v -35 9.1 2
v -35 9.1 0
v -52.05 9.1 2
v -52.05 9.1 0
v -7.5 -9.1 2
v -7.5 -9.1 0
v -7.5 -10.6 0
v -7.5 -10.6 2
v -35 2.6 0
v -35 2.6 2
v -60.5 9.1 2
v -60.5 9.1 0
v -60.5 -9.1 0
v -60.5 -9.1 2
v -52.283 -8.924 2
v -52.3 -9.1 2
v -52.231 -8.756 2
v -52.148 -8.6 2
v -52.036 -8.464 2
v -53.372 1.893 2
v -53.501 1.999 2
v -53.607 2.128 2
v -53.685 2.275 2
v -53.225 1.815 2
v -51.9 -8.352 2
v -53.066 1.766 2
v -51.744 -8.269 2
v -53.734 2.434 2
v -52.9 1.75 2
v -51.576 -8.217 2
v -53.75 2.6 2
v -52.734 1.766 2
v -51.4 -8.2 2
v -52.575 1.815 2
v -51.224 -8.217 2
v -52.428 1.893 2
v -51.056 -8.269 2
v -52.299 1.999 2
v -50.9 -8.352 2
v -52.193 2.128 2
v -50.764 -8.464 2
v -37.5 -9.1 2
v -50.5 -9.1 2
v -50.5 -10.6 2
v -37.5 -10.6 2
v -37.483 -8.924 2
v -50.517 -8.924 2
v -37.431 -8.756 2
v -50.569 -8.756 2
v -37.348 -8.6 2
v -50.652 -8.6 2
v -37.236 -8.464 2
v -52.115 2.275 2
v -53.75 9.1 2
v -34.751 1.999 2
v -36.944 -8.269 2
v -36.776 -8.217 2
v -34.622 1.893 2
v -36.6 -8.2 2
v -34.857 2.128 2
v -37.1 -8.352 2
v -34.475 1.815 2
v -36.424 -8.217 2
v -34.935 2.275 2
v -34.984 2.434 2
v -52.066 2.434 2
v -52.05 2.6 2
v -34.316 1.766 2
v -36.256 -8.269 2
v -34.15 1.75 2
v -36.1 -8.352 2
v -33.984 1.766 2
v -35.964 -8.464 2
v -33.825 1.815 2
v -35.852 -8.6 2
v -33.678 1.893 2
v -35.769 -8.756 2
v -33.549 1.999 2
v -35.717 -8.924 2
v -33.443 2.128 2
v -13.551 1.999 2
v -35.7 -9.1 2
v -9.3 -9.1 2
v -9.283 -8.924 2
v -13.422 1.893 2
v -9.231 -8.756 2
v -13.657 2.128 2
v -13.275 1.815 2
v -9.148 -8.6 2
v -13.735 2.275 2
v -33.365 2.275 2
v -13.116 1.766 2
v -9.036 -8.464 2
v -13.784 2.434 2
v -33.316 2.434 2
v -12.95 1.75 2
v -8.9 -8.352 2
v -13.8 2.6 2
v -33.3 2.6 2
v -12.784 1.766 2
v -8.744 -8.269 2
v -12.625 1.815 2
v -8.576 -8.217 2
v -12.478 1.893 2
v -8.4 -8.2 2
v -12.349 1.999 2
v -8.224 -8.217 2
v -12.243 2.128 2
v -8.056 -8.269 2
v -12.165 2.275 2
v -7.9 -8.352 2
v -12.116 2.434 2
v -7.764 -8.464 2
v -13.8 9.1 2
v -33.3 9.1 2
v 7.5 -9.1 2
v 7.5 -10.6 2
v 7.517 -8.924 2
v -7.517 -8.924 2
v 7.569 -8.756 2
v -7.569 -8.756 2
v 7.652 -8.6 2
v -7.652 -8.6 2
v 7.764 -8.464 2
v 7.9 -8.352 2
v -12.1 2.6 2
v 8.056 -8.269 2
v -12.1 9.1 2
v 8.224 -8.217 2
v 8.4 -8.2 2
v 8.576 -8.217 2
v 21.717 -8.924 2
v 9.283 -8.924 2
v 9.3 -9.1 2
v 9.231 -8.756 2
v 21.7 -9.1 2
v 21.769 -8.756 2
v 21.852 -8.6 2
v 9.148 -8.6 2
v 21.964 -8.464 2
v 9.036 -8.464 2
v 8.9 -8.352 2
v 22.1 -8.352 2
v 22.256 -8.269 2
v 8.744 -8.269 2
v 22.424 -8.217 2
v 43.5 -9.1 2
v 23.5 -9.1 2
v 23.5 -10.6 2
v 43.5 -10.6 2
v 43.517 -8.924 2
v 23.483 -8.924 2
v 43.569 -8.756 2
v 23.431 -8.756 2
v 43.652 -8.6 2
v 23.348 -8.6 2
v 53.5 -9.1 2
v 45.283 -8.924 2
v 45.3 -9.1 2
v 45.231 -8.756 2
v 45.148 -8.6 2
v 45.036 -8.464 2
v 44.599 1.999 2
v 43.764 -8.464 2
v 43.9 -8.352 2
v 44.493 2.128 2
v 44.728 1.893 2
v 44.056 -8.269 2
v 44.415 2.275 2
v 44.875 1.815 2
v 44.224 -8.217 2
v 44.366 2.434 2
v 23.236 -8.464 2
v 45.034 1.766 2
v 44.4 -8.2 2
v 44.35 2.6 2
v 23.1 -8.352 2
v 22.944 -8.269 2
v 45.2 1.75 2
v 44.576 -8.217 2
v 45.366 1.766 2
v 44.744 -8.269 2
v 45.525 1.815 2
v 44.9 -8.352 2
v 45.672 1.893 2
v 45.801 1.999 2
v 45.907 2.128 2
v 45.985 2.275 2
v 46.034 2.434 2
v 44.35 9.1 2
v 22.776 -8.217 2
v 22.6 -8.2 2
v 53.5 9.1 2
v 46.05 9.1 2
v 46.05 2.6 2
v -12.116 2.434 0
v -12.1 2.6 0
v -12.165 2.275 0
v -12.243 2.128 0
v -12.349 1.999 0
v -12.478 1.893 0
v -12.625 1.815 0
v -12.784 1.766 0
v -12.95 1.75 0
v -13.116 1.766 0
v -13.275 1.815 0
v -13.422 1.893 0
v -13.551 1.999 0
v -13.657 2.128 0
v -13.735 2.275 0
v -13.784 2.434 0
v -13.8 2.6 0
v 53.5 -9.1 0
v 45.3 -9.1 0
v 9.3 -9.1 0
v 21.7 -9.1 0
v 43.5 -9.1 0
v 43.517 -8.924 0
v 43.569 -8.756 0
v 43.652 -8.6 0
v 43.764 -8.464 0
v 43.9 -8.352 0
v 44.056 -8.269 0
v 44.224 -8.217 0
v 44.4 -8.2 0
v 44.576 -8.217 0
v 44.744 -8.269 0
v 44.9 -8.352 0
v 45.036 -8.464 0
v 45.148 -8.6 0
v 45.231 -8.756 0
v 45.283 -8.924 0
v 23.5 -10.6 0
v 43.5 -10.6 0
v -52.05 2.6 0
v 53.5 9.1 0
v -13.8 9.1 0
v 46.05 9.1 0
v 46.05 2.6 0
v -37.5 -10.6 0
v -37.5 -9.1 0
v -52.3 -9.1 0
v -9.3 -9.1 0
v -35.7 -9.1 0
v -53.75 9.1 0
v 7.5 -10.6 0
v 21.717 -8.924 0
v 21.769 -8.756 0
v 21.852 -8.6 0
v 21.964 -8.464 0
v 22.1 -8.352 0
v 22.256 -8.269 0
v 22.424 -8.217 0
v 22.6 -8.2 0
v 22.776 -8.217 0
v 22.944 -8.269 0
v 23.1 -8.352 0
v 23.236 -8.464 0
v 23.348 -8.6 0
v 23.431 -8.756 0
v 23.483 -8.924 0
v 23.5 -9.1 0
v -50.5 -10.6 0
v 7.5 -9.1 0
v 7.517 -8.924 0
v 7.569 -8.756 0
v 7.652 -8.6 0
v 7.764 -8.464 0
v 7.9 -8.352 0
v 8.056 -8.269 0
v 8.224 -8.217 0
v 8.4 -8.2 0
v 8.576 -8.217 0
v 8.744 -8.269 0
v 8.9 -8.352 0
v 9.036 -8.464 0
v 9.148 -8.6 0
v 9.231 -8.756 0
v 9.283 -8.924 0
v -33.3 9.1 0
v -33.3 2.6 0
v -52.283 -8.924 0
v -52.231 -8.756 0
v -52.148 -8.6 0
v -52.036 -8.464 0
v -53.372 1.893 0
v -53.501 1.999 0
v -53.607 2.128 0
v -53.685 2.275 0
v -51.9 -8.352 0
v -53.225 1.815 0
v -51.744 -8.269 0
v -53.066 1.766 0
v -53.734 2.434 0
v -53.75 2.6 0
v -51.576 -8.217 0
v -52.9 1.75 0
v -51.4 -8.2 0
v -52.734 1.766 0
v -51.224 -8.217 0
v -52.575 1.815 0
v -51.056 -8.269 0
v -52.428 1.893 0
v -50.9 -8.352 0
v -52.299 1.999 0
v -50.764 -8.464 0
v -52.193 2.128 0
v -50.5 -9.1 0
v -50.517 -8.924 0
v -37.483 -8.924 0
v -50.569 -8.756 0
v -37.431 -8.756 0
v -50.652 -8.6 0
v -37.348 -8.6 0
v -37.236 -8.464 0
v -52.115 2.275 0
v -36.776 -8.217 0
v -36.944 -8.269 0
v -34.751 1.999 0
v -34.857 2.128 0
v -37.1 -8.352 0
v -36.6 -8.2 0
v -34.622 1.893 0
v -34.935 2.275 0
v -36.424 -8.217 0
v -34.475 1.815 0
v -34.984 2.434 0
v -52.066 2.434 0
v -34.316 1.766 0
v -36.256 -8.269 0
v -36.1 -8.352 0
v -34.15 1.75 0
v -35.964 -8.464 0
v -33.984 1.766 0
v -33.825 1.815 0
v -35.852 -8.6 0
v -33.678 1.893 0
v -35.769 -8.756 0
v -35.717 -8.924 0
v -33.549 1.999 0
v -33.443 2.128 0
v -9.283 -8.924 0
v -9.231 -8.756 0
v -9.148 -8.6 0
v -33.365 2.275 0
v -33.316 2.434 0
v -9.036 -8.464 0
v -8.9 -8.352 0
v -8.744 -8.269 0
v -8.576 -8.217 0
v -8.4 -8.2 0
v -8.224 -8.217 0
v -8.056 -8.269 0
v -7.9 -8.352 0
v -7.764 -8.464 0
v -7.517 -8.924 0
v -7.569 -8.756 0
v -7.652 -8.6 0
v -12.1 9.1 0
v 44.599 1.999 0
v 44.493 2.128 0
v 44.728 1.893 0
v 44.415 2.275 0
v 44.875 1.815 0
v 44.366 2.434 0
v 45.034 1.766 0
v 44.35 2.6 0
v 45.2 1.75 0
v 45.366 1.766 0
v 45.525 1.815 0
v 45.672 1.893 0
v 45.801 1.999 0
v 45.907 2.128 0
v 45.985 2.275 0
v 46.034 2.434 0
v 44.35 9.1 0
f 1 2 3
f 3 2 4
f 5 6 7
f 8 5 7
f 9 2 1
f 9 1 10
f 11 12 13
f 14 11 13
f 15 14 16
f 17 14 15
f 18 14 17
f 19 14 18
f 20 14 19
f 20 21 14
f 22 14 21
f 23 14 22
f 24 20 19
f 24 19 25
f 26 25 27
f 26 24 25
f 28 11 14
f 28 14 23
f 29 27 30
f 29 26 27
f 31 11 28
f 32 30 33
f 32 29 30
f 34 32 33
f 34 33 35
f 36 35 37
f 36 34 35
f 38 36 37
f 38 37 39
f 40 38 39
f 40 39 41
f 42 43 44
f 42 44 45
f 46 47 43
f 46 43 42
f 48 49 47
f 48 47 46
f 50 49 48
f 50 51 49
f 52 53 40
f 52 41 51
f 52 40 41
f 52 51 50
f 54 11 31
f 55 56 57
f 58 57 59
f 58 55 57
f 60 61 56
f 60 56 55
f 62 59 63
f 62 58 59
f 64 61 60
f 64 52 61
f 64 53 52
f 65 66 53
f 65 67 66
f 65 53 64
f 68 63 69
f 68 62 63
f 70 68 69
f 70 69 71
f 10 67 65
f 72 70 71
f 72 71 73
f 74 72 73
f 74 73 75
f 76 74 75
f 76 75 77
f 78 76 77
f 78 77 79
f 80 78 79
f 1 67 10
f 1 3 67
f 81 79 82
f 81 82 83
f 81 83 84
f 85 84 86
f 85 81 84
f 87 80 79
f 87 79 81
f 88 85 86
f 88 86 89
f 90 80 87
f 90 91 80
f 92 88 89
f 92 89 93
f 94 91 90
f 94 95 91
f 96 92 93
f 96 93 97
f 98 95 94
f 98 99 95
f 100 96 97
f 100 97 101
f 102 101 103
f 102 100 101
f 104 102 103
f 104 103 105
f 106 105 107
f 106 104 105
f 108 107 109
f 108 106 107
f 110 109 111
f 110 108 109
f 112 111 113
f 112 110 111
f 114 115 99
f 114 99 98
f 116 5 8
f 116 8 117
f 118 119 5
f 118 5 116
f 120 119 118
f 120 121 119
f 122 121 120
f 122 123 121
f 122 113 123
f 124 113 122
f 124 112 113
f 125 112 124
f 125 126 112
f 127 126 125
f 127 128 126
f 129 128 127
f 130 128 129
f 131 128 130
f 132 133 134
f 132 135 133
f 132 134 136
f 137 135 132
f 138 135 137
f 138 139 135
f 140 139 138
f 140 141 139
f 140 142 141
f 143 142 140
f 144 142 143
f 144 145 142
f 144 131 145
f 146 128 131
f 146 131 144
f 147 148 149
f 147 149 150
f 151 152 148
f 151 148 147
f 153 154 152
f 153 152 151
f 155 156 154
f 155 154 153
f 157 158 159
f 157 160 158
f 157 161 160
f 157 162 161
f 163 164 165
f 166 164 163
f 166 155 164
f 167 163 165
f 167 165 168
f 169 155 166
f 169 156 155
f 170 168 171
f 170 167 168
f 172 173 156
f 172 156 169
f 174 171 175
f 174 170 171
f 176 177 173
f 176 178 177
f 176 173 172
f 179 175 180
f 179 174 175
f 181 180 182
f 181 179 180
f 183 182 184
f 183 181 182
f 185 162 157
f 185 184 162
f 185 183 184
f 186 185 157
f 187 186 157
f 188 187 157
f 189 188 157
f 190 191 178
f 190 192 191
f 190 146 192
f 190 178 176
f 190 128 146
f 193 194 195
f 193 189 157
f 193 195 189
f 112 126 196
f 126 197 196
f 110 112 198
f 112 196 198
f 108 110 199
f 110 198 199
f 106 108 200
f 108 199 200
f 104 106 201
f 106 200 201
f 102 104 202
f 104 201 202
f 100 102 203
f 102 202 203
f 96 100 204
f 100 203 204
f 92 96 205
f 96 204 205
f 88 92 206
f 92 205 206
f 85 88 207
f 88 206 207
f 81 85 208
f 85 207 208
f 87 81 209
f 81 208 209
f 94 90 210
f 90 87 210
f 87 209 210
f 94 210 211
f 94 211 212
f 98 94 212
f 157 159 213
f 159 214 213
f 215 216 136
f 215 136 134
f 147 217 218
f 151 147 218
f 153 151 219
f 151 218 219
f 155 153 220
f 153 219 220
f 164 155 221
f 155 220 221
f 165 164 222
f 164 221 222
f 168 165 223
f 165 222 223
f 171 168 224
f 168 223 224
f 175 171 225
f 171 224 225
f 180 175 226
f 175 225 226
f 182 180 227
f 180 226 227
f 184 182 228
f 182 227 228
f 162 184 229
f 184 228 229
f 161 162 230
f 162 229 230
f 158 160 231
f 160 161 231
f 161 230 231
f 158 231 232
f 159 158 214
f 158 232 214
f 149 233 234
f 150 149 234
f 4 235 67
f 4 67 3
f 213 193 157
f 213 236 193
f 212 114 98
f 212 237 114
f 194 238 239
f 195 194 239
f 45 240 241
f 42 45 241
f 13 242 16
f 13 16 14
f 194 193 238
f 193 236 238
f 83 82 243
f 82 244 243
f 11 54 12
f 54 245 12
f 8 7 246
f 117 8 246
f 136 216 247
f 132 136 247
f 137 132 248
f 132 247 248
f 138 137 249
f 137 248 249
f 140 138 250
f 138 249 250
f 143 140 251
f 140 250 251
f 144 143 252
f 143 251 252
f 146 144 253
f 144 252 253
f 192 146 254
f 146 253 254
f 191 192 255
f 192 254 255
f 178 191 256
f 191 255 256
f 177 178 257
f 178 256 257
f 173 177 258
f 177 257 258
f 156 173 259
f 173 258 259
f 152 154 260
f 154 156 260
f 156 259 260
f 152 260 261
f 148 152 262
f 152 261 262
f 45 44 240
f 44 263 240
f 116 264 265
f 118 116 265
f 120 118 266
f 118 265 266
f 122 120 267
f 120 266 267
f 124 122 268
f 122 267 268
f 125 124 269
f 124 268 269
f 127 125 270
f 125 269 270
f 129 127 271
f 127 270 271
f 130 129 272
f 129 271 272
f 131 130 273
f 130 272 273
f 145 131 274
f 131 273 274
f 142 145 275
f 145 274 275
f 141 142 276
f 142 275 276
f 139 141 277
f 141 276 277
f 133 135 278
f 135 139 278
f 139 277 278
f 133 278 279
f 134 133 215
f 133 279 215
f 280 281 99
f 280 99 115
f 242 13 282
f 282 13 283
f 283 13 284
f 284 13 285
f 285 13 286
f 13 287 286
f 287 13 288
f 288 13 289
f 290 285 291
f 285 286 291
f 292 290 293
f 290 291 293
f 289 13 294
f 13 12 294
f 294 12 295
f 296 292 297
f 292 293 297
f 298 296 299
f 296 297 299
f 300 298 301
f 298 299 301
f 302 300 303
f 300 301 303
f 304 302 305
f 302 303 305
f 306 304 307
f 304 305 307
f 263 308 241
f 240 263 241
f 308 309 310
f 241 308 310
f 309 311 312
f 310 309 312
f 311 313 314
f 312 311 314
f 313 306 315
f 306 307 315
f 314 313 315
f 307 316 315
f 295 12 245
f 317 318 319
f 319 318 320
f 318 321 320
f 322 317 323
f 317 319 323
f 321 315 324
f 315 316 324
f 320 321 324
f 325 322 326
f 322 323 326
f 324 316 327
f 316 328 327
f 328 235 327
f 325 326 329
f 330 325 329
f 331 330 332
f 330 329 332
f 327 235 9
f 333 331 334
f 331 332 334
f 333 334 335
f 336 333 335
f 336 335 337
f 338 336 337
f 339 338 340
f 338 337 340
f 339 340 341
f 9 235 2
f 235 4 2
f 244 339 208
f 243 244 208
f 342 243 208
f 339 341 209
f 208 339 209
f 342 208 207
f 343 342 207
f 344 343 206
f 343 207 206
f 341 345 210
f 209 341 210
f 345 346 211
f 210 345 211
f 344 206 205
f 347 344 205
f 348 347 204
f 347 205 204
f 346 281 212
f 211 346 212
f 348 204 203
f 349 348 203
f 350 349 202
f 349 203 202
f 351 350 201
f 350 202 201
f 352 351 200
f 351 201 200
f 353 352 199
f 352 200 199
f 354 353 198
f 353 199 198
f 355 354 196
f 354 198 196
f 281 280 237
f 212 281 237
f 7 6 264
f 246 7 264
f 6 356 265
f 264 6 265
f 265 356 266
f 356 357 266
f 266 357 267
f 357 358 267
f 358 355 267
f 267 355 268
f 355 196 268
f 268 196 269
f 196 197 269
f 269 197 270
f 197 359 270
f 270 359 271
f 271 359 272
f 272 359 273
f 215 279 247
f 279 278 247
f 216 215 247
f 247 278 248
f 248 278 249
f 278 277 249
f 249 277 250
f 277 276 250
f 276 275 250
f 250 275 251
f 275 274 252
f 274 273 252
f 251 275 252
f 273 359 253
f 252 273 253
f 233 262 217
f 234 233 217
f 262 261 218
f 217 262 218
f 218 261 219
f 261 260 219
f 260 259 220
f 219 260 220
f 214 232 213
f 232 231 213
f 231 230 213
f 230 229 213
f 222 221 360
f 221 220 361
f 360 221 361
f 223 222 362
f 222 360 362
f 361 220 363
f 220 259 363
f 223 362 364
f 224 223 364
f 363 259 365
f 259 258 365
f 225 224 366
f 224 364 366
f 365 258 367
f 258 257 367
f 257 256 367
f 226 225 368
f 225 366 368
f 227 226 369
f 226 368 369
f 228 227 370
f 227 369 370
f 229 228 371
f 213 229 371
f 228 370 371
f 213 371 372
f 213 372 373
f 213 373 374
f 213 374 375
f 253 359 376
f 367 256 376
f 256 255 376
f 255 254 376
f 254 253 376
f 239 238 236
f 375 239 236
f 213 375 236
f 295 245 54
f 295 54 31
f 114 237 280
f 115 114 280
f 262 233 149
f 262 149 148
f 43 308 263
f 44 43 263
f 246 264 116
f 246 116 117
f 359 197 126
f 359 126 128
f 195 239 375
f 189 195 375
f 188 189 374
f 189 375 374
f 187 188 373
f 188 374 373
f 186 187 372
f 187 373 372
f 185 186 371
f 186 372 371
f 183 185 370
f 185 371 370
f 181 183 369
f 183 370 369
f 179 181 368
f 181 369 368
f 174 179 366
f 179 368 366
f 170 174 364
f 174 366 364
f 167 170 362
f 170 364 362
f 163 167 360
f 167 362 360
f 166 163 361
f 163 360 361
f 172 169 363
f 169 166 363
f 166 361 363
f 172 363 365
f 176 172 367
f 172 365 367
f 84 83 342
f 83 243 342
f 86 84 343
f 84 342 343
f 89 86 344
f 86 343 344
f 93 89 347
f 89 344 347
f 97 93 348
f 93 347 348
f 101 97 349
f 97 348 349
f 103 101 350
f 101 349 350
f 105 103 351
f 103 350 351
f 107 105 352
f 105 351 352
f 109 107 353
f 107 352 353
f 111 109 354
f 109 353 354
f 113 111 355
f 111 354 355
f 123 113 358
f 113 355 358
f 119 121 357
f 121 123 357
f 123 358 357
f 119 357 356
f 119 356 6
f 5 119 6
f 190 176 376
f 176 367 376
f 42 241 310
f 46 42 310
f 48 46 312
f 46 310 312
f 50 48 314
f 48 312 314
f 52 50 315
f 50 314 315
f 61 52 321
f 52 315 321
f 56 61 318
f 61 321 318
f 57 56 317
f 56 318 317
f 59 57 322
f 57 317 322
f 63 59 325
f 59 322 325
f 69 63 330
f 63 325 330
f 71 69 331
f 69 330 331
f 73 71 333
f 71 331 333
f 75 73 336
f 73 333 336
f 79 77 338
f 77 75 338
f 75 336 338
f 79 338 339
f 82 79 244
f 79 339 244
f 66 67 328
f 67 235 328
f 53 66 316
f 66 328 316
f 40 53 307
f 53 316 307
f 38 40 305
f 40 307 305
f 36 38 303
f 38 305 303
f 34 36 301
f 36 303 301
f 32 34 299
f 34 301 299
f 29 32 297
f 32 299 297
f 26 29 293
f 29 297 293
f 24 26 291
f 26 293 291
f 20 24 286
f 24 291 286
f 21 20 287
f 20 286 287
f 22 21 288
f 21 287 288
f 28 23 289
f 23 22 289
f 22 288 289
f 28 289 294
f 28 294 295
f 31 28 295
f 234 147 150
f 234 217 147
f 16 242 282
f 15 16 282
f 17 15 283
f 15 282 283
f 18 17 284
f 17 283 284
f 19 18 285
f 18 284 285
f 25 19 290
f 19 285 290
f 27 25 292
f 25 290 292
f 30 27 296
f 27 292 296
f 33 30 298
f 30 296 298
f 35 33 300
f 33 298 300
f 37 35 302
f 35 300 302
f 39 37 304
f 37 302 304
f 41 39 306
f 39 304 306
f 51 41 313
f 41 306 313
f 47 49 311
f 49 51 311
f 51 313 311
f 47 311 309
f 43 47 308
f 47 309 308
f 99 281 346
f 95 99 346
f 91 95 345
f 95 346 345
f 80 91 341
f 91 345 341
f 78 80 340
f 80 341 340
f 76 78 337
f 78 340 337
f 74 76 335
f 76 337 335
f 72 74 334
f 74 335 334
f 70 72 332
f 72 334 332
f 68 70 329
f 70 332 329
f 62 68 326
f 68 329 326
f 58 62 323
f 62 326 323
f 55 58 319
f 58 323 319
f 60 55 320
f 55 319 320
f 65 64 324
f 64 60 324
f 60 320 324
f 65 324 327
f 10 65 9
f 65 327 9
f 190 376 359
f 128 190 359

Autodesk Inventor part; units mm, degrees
ref_plane "YZ Plane" through (0, 0, 0) normal (1, 0, 0) x (0, 1, 0)
ref_plane "XZ Plane" through (0, 0, 0) normal (0, 1, 0) x (-1, 0, 0)
ref_plane "XY Plane" through (0, 0, 0) normal (0, 0, 1) x (1, 0, 0)
sketch "Sketch4" plane through (0, 0, 0) normal (0, 0, 1) x (1, 0, 0)
  line L0 (-60.5, 9.1) -> (-60.5, -9.1)
  line L1 (53.5, 9.1) -> (53.5, -9.1)
  line L2 (-37.5, -10.6) -> (-37.5, -9.1)
  line L3 (-50.5, -9.1) -> (-50.5, -10.6)
  line L4 (-52.3, -9.1) -> (-60.5, -9.1)
  line L5 (-35.7, -9.1) -> (-9.3, -9.1)
  line L6 (-7.5, -9.1) -> (-7.5, -10.6)
  line L7 (23.5, -10.6) -> (23.5, -9.1)
  line L8 (43.5, -9.1) -> (43.5, -10.6)
  line L9 (45.3, -9.1) -> (53.5, -9.1)
  line L10 (21.7, -9.1) -> (9.3, -9.1)
  line L11 (7.5, -9.1) -> (7.5, -10.6)
  line L12 (-50.5, -10.6) -> (-37.5, -10.6)
  line L13 (-7.5, -10.6) -> (7.5, -10.6)
  line L14 (23.5, -10.6) -> (43.5, -10.6)
  arc A0 (-50.5, -9.1) -> (-52.3, -9.1) centre (-51.4, -9.1) ccw
  arc A1 (-35.7, -9.1) -> (-37.5, -9.1) centre (-36.6, -9.1) ccw
  arc A2 (-7.5, -9.1) -> (-9.3, -9.1) centre (-8.4, -9.1) ccw
  arc A3 (9.3, -9.1) -> (7.5, -9.1) centre (8.4, -9.1) ccw
  arc A4 (23.5, -9.1) -> (21.7, -9.1) centre (22.6, -9.1) ccw
  arc A5 (45.3, -9.1) -> (43.5, -9.1) centre (44.4, -9.1) ccw
  line L15 (-53.75, 9.1) -> (-53.75, 2.6)
  line L16 (-52.05, 2.6) -> (-52.05, 9.1)
  line L17 (-35, 9.1) -> (-35, 2.6)
  line L18 (-33.3, 2.6) -> (-33.3, 9.1)
  line L19 (-13.8, 9.1) -> (-13.8, 2.6)
  line L20 (-12.1, 2.6) -> (-12.1, 9.1)
  line L21 (46.05, 9.1) -> (46.05, 2.6)
  line L22 (44.35, 2.6) -> (44.35, 9.1)
  line L23 (-53.75, 9.1) -> (-60.5, 9.1)
  line L24 (-35, 9.1) -> (-52.05, 9.1)
  line L25 (-13.8, 9.1) -> (-33.3, 9.1)
  line L26 (53.5, 9.1) -> (46.05, 9.1)
  line L27 (44.35, 9.1) -> (-12.1, 9.1)
  arc A6 (-53.75, 2.6) -> (-52.05, 2.6) centre (-52.9, 2.6) ccw
  arc A7 (-35, 2.6) -> (-33.3, 2.6) centre (-34.15, 2.6) ccw
  arc A8 (-13.8, 2.6) -> (-12.1, 2.6) centre (-12.95, 2.6) ccw
  arc A9 (44.35, 2.6) -> (46.05, 2.6) centre (45.2, 2.6) ccw
  point P0 (0, 0)
  point P1 (0, 9.1)
  point P2 (-60.5, 0)
  point P3 (0, -10.6)
  dimension "d25" = 10
  dimension "d26" = 13
  dimension "d27" = 30
  dimension "d28" = 10
  dimension "d29" = 114
  dimension "d33" = 1.5
  dimension "d36" = 1.8
  dimension "d37" = 20
  dimension "d38" = 15
  dimension "d39" = 16
  dimension "d41" = 1.7
  dimension "d44" = 19.5
  dimension "d45" = 17.05
  dimension "d46" = 56.45
  dimension "d48" = 6.75
  dimension "d49" = 18.2
  dimension "d51" = 6.5
  dimension "d52" = 1.7
  dimension "d53" = 1.7
  dimension "d54" = 1.7
extrude "Extrusion2" add sketch "Sketch4" along normal blind 2
equation "\"d52\" = d41"
equation "\"d53\" = d52"
equation "\"d54\" = d53"
properties part number "Board_separator"
